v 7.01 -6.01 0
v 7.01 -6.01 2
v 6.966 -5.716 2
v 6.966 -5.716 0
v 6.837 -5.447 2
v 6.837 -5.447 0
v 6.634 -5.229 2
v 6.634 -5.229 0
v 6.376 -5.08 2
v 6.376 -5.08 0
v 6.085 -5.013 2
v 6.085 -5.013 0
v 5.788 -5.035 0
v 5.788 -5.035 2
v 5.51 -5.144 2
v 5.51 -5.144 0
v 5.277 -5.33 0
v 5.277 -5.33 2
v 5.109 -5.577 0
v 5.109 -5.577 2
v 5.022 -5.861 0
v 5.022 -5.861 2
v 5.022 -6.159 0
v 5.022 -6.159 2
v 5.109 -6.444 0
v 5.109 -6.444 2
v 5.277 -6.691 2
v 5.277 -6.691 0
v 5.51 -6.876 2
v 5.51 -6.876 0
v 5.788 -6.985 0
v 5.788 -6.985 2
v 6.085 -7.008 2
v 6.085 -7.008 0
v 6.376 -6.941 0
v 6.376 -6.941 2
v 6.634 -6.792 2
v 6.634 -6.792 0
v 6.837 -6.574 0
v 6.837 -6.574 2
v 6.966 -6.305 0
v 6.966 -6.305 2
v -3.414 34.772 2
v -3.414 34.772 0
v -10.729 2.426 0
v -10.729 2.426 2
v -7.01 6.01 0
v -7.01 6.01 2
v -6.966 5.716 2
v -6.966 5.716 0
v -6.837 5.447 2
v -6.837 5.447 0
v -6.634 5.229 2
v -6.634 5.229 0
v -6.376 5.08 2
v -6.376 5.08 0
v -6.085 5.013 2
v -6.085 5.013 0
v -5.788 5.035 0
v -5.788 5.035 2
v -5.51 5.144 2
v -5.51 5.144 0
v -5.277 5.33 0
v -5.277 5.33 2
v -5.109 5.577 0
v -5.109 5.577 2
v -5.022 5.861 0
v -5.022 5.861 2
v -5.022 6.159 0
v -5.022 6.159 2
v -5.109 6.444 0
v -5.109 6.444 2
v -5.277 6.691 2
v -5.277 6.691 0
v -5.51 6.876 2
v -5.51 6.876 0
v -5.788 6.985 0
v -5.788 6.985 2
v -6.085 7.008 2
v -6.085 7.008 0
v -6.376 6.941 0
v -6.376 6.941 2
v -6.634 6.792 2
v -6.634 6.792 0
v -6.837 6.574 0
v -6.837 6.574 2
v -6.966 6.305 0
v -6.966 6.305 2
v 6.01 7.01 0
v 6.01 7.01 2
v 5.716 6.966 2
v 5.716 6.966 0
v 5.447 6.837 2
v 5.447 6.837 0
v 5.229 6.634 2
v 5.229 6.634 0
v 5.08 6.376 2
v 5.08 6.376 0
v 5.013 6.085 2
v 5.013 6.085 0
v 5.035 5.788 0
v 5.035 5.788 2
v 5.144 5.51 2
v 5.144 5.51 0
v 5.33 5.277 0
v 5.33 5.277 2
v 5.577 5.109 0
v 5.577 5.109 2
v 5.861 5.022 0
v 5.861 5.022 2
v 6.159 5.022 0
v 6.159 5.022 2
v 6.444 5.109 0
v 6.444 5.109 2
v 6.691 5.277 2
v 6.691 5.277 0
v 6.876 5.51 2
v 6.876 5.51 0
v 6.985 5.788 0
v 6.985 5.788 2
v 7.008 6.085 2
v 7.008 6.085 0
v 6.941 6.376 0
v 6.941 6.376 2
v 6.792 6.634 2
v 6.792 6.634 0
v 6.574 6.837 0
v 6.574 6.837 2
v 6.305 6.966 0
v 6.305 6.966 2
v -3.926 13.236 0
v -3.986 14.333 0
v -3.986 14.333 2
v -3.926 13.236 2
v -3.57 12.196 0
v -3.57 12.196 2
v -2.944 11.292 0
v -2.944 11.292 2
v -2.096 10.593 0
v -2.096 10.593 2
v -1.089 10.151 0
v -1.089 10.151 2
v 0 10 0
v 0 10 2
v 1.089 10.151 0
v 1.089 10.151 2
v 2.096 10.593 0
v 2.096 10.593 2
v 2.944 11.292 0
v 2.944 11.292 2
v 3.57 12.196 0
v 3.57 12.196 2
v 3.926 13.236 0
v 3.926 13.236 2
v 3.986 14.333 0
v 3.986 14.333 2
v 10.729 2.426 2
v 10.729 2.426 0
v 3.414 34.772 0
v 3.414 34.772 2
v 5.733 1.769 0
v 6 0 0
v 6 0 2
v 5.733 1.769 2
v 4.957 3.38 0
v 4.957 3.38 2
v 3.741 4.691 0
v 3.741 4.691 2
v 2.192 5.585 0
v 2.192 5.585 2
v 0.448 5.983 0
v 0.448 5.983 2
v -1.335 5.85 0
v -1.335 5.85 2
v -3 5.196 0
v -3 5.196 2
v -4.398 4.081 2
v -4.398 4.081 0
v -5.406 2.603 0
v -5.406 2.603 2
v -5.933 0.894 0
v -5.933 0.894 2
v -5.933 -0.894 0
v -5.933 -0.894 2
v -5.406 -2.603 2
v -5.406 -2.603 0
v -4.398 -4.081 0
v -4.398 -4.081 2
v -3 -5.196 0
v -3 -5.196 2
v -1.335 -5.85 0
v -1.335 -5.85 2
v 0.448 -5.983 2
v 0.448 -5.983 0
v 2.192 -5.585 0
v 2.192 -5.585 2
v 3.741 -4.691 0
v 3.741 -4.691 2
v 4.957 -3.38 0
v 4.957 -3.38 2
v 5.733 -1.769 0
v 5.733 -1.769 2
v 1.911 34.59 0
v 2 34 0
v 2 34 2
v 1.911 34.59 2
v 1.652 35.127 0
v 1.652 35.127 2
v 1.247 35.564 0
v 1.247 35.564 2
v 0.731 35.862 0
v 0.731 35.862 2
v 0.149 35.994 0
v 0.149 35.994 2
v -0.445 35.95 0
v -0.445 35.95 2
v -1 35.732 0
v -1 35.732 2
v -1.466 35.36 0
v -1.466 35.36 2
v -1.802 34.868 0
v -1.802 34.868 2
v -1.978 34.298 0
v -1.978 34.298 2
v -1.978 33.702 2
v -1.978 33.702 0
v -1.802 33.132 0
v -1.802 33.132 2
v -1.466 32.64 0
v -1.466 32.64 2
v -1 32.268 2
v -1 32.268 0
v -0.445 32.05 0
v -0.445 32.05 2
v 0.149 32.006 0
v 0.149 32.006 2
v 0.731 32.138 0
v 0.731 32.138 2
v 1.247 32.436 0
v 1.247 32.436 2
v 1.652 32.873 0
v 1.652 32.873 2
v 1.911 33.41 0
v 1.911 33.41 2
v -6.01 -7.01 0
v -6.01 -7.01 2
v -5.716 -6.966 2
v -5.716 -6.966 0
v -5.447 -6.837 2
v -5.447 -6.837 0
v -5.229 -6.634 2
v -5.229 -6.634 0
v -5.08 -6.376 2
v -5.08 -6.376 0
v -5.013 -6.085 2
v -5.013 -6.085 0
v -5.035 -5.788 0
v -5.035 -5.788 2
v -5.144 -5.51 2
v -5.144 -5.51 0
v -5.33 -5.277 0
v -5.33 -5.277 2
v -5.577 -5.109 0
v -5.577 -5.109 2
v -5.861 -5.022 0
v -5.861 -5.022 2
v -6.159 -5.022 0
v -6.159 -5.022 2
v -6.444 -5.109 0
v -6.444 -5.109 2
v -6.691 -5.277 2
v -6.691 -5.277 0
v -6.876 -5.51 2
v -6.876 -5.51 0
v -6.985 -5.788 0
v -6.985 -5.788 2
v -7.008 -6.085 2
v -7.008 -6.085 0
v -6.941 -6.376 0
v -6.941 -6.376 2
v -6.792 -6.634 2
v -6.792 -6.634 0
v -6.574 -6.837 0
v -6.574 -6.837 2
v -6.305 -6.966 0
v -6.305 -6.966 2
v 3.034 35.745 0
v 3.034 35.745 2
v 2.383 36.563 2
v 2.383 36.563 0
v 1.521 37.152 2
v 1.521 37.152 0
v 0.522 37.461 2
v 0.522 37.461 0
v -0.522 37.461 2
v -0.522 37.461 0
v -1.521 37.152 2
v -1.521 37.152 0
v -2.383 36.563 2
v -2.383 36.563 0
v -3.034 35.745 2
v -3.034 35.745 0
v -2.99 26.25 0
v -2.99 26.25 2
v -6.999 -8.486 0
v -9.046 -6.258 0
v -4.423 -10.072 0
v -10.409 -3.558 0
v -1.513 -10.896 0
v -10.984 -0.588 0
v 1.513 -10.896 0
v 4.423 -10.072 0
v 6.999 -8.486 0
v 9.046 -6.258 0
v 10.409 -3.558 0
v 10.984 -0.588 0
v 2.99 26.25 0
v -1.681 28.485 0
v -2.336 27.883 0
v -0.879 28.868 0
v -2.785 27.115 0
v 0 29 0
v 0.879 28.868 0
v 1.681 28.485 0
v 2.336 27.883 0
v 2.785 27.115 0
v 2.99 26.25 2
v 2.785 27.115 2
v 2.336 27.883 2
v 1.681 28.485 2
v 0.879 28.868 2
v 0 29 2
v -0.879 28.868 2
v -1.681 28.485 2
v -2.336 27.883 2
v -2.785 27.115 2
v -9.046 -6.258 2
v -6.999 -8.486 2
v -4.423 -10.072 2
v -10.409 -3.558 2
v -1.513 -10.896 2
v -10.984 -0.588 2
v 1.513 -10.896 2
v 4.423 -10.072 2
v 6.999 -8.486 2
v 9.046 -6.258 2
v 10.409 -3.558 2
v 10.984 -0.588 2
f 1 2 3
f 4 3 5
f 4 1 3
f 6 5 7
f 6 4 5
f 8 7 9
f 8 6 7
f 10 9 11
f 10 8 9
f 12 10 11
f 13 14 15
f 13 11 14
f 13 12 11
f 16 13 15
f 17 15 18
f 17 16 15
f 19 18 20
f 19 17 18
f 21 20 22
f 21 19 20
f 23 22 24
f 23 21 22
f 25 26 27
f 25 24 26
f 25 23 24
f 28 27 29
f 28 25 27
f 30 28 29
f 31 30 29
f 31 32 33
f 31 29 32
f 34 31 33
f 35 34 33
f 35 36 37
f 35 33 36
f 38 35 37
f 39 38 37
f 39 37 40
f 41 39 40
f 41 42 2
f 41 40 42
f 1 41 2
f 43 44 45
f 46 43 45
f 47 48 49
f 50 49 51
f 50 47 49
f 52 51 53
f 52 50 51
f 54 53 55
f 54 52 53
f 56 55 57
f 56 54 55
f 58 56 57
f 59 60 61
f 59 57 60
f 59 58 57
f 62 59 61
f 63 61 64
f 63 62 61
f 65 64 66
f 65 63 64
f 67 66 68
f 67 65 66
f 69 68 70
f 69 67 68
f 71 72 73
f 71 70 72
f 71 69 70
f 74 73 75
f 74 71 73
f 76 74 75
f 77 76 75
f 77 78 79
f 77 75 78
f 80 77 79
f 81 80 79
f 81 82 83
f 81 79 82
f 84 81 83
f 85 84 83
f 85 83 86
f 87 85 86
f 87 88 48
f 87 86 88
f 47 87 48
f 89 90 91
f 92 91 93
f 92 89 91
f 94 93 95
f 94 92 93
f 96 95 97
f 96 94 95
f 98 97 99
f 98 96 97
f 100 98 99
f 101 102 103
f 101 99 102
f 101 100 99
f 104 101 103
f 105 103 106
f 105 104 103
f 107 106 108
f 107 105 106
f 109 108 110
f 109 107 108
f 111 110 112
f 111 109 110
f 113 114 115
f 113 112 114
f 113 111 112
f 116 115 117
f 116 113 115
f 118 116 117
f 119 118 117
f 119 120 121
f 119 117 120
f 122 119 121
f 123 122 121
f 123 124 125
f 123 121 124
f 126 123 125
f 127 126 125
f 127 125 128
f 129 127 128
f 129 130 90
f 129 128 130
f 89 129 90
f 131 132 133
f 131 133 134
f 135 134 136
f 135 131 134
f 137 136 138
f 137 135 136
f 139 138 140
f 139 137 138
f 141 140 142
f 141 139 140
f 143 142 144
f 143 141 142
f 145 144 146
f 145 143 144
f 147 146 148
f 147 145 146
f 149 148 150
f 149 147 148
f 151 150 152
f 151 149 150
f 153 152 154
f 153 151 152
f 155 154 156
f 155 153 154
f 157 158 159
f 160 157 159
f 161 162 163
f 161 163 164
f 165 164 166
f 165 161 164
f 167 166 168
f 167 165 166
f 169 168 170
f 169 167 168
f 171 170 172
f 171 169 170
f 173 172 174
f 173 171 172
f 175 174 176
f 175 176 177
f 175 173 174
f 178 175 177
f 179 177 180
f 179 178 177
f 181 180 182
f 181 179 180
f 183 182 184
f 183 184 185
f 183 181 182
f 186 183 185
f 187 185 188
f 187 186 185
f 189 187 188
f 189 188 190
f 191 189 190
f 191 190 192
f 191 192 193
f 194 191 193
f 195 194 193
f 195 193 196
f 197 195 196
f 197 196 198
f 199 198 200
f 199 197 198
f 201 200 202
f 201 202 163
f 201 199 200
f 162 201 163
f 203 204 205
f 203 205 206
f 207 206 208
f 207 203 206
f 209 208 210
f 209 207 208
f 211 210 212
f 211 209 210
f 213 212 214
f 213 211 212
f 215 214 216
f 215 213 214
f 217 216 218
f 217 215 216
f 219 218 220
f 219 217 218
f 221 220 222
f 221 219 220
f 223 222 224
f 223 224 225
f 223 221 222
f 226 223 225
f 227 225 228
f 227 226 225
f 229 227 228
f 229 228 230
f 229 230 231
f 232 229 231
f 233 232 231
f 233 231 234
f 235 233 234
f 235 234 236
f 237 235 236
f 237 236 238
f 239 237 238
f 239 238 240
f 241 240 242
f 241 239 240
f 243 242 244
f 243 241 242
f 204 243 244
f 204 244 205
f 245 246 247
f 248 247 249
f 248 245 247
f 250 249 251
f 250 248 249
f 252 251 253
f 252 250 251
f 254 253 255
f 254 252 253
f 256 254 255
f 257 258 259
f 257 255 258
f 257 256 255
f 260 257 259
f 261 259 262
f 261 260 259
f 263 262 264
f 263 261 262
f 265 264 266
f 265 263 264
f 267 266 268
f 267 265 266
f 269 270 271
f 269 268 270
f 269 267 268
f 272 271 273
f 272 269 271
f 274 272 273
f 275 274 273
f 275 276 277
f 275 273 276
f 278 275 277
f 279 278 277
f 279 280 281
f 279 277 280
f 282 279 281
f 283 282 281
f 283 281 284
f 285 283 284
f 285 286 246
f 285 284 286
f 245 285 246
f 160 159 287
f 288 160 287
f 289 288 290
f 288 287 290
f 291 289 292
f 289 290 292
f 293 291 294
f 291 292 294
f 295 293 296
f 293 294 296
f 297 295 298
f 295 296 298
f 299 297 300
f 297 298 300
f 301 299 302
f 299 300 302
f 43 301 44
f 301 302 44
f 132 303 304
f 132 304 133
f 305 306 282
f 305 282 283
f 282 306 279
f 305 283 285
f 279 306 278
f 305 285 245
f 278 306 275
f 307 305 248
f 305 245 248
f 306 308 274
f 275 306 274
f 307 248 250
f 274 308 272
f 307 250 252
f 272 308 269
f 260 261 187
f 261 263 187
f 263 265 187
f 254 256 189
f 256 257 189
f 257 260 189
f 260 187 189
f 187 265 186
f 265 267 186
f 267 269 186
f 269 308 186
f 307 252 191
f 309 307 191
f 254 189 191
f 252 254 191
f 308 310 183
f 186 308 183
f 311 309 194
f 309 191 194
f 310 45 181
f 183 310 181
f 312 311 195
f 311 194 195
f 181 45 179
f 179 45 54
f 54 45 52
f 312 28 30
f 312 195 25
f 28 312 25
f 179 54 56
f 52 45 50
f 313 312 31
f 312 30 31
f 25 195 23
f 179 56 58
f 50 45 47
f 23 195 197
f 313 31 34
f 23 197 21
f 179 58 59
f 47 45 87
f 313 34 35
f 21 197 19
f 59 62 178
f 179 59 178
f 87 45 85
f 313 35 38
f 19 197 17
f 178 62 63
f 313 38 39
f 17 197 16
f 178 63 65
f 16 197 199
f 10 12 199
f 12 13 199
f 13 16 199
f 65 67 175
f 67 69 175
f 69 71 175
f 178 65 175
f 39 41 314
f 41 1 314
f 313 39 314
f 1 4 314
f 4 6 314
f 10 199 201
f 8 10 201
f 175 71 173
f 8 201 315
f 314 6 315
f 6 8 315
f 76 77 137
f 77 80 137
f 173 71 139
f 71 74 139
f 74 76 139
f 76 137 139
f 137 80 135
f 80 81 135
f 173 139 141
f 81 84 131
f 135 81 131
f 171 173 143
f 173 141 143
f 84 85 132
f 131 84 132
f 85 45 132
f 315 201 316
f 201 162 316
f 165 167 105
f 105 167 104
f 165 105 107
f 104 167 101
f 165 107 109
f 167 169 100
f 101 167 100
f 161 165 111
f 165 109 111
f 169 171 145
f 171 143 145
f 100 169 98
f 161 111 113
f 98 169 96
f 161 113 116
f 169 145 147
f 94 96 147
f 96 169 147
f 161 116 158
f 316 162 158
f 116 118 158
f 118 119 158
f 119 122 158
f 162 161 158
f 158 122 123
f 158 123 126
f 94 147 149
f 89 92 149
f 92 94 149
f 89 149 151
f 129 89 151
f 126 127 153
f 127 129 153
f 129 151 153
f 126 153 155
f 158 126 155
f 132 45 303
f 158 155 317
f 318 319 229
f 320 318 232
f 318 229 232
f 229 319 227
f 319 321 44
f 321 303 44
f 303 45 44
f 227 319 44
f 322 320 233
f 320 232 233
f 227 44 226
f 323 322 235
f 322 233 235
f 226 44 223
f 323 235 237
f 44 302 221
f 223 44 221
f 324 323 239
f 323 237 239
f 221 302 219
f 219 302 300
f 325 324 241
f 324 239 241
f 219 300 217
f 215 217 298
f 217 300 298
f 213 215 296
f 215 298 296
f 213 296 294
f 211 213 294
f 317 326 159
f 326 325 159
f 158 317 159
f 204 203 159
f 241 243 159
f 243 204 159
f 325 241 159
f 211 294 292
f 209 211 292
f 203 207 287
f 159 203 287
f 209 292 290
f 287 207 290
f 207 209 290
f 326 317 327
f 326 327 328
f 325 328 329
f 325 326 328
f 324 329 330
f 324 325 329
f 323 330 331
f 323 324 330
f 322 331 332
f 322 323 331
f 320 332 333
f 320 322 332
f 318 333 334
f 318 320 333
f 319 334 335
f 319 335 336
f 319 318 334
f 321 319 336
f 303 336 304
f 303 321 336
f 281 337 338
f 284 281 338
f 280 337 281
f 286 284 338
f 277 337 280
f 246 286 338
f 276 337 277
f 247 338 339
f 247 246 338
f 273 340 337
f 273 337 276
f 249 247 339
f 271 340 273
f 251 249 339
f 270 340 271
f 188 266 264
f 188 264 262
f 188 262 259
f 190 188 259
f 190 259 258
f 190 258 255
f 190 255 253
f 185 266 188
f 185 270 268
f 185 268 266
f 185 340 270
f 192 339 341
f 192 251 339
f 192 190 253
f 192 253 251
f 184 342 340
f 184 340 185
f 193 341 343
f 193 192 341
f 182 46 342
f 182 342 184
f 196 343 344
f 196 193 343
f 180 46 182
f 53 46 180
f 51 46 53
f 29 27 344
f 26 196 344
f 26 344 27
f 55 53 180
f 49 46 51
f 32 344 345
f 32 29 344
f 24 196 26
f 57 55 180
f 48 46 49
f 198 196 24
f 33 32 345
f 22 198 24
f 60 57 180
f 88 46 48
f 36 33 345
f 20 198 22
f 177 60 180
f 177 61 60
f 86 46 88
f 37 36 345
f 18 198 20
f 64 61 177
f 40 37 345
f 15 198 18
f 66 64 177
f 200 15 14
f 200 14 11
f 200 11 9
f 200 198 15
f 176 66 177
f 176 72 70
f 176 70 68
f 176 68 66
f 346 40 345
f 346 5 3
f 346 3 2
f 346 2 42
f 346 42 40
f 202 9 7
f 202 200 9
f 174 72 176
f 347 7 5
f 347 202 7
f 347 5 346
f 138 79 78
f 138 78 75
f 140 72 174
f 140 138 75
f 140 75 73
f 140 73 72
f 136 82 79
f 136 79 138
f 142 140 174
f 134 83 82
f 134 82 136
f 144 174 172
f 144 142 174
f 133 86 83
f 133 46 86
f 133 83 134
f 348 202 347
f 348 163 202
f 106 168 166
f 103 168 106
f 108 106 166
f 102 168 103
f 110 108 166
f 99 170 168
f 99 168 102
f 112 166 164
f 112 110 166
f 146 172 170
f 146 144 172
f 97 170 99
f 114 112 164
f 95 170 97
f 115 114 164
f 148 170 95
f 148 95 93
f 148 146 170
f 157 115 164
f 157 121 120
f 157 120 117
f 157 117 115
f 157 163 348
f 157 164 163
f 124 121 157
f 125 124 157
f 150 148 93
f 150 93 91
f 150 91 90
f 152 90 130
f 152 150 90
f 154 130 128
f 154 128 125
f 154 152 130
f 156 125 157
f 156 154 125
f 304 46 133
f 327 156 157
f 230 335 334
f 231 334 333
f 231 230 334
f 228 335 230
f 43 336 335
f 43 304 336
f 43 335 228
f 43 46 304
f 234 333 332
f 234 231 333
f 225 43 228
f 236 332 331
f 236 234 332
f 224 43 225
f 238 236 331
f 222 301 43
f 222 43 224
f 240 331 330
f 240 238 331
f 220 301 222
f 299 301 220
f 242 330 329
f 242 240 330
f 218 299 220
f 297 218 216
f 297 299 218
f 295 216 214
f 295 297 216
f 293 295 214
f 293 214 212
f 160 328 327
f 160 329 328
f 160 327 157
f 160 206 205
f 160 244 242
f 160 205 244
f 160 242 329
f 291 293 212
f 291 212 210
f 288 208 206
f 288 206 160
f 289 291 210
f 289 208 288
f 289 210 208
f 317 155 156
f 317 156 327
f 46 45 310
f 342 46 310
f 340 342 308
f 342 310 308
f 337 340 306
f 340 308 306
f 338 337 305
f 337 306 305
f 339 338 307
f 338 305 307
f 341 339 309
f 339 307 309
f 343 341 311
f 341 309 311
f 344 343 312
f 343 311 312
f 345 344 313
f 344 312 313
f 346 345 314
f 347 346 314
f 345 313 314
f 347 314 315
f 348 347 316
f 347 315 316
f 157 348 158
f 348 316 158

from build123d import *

# Parameters (mm, degrees)
SKETCH_1_R               = 6
SKETCH_1_R_2             = 2
EXTRUDE_1_DEPTH          = 2
SKETCH_2_R               = 1
CUT_EXTRUDE_8_DEPTH      = 40.131189606
PATTERN_CIRCULAR_2_COUNT = 4


with BuildPart() as part:
    # 草图1 → 凸台-拉伸1 (new body)
    with BuildSketch(Plane.XY):
        with BuildLine():
            Line((-3.413784582, 34.772058824), (-10.729037258, 2.426470588))
            ThreePointArc((-10.729037258, 2.426470588), (0, -11), (10.729037258, 2.426470588))
            Line((10.729037258, 2.426470588), (3.413784582, 34.772058824))
            ThreePointArc((3.413784582, 34.772058824), (0, 37.5), (-3.413784582, 34.772058824))
        make_face()
        Circle(SKETCH_1_R, mode=Mode.SUBTRACT)
        with Locations((0, 34)):
            Circle(SKETCH_1_R_2, mode=Mode.SUBTRACT)
        with BuildLine():
            Line((-2.989565186, 26.25), (-3.986086914, 14.333333333))
            ThreePointArc((-3.986086914, 14.333333333), (0, 10), (3.986086914, 14.333333333))
            Line((3.986086914, 14.333333333), (2.989565186, 26.25))
            ThreePointArc((2.989565186, 26.25), (0, 29), (-2.989565186, 26.25))
        make_face(mode=Mode.SUBTRACT)
    extrude(amount=EXTRUDE_1_DEPTH)

    # 草图2 → 切除-拉伸8 (cut, through all)
    with BuildSketch(Plane.XY):
        with Locations((6.01040764, -6.01040764)):
            Circle(SKETCH_2_R)
    cut_extrude_8 = extrude(amount=CUT_EXTRUDE_8_DEPTH, mode=Mode.SUBTRACT)

    # 阵列(圆周)2: 切除-拉伸8 ×4 about axis
    pattern_circular_2_axis = Axis((0, 0, 0), (0, 0, 1))
    for i in range(1, PATTERN_CIRCULAR_2_COUNT):
        add(cut_extrude_8.rotate(pattern_circular_2_axis, i * 360 / PATTERN_CIRCULAR_2_COUNT), mode=Mode.SUBTRACT)


solid = part.part
